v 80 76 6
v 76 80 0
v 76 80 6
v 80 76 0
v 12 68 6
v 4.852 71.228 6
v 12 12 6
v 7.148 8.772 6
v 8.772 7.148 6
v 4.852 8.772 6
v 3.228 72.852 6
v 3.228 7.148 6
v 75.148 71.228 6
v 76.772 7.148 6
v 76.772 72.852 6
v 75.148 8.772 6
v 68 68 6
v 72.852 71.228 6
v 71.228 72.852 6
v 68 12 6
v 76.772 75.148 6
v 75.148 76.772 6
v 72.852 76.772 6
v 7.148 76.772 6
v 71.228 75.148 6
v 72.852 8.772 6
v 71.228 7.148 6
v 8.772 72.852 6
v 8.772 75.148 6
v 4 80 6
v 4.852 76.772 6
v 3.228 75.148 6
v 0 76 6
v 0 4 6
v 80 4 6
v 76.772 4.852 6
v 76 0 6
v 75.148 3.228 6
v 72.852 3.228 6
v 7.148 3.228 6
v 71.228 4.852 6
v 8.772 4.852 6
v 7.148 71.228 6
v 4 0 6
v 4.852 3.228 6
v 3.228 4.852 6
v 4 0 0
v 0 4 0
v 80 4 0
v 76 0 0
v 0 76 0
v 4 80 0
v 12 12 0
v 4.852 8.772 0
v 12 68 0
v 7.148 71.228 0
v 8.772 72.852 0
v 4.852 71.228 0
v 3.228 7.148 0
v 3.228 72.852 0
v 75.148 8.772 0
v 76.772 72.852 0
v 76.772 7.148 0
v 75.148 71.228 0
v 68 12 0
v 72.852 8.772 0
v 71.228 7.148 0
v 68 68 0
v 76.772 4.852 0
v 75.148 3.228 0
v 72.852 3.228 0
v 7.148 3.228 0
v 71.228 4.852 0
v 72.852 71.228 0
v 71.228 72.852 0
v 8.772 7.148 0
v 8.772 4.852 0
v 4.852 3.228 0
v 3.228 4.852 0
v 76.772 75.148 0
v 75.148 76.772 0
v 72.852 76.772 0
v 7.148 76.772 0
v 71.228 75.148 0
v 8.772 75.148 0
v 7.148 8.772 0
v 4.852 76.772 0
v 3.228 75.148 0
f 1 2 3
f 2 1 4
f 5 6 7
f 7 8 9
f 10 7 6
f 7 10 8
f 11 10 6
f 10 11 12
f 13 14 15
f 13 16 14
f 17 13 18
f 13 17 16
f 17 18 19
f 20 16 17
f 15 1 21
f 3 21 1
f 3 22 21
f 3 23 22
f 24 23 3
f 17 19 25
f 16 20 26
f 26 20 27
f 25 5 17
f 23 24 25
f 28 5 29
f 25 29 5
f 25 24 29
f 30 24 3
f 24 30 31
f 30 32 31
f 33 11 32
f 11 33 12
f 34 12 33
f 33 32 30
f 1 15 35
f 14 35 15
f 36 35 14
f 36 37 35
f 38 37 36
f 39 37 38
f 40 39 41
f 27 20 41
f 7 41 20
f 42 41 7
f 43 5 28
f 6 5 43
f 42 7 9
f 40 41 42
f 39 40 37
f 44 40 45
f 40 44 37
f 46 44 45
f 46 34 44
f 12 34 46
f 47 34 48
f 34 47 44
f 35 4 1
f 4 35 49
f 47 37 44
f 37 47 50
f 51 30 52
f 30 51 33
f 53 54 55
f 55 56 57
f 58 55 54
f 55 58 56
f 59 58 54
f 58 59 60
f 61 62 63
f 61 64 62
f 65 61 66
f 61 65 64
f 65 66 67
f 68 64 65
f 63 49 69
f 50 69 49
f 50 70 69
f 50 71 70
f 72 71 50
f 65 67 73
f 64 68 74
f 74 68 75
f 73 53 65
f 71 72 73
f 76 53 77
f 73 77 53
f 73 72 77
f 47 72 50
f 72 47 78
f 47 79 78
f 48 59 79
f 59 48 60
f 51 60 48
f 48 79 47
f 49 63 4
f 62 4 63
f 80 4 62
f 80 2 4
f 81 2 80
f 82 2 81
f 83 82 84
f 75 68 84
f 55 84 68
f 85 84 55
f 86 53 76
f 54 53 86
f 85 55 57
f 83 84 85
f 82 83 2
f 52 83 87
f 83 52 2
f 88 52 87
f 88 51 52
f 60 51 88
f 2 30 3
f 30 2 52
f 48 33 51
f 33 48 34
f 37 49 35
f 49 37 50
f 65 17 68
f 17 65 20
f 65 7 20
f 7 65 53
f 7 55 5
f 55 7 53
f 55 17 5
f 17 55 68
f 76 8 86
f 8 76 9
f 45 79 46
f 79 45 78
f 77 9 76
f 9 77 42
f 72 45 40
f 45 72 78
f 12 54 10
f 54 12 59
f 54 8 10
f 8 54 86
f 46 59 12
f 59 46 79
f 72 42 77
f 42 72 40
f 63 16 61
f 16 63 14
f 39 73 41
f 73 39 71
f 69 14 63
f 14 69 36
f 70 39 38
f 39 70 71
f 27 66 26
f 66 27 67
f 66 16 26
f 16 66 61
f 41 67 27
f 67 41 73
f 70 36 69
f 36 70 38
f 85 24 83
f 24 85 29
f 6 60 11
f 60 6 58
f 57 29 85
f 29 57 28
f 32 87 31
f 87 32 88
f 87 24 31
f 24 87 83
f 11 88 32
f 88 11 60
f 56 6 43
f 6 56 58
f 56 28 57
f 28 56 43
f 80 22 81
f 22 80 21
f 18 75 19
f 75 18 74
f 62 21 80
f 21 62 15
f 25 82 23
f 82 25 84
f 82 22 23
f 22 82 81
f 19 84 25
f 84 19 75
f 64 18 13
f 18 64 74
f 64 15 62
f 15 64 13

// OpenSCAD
$fn = 32;

// ----------------------------------------------------------------------
// Frame plate: 80 x 80 frame, 12 mm rails
// ----------------------------------------------------------------------

// --- parameters (mm) ---
plate_l = 80;             // plate length, X
plate_w = 80;             // plate width, Y
plate_t = 6;              // plate thickness, Z (extrusion height)
corner_c = 4;             // corner chamfer
frame_bar = 12;           // frame rail width
bolt_r = 3;               // corner bolt window radius
bolt_inset = 6;           // bolt centre inset from the edges

win_l = plate_l - 2 * frame_bar;  // window length
win_w = plate_w - 2 * frame_bar;  // window width
bolt_d = 2 * bolt_r;  // corner hole diameter

profile = [[4, 0], [76, 0], [80, 4], [80, 76], [76, 80], [4, 80], [0, 76], [0, 4]];  // primary outline, 8 points, counter clockwise
void_1 = [[12, 12], [68, 12], [68, 68], [12, 68]];  // the window, 4 points
void_2 = [[8.772, 7.148], [7.148, 8.772], [4.852, 8.772], [3.228, 7.148], [3.228, 4.852], [4.852, 3.228], [7.148, 3.228], [8.772, 4.852]];  // corner bolt window, 8 points
void_3 = [[76.772, 7.148], [75.148, 8.772], [72.852, 8.772], [71.228, 7.148], [71.228, 4.852], [72.852, 3.228], [75.148, 3.228], [76.772, 4.852]];  // corner bolt window, 8 points
void_4 = [[8.772, 75.148], [7.148, 76.772], [4.852, 76.772], [3.228, 75.148], [3.228, 72.852], [4.852, 71.228], [7.148, 71.228], [8.772, 72.852]];  // corner bolt window, 8 points
void_5 = [[76.772, 75.148], [75.148, 76.772], [72.852, 76.772], [71.228, 75.148], [71.228, 72.852], [72.852, 71.228], [75.148, 71.228], [76.772, 72.852]];  // corner bolt window, 8 points

// --- the one profile operation ---
difference() {
  linear_extrude(height = plate_t) polygon(points = profile);
  translate([0, 0, -1])
    linear_extrude(height = plate_t + 2) polygon(points = void_1);
  translate([0, 0, -1])
    linear_extrude(height = plate_t + 2) polygon(points = void_2);
  translate([0, 0, -1])
    linear_extrude(height = plate_t + 2) polygon(points = void_3);
  translate([0, 0, -1])
    linear_extrude(height = plate_t + 2) polygon(points = void_4);
  translate([0, 0, -1])
    linear_extrude(height = plate_t + 2) polygon(points = void_5);
}
